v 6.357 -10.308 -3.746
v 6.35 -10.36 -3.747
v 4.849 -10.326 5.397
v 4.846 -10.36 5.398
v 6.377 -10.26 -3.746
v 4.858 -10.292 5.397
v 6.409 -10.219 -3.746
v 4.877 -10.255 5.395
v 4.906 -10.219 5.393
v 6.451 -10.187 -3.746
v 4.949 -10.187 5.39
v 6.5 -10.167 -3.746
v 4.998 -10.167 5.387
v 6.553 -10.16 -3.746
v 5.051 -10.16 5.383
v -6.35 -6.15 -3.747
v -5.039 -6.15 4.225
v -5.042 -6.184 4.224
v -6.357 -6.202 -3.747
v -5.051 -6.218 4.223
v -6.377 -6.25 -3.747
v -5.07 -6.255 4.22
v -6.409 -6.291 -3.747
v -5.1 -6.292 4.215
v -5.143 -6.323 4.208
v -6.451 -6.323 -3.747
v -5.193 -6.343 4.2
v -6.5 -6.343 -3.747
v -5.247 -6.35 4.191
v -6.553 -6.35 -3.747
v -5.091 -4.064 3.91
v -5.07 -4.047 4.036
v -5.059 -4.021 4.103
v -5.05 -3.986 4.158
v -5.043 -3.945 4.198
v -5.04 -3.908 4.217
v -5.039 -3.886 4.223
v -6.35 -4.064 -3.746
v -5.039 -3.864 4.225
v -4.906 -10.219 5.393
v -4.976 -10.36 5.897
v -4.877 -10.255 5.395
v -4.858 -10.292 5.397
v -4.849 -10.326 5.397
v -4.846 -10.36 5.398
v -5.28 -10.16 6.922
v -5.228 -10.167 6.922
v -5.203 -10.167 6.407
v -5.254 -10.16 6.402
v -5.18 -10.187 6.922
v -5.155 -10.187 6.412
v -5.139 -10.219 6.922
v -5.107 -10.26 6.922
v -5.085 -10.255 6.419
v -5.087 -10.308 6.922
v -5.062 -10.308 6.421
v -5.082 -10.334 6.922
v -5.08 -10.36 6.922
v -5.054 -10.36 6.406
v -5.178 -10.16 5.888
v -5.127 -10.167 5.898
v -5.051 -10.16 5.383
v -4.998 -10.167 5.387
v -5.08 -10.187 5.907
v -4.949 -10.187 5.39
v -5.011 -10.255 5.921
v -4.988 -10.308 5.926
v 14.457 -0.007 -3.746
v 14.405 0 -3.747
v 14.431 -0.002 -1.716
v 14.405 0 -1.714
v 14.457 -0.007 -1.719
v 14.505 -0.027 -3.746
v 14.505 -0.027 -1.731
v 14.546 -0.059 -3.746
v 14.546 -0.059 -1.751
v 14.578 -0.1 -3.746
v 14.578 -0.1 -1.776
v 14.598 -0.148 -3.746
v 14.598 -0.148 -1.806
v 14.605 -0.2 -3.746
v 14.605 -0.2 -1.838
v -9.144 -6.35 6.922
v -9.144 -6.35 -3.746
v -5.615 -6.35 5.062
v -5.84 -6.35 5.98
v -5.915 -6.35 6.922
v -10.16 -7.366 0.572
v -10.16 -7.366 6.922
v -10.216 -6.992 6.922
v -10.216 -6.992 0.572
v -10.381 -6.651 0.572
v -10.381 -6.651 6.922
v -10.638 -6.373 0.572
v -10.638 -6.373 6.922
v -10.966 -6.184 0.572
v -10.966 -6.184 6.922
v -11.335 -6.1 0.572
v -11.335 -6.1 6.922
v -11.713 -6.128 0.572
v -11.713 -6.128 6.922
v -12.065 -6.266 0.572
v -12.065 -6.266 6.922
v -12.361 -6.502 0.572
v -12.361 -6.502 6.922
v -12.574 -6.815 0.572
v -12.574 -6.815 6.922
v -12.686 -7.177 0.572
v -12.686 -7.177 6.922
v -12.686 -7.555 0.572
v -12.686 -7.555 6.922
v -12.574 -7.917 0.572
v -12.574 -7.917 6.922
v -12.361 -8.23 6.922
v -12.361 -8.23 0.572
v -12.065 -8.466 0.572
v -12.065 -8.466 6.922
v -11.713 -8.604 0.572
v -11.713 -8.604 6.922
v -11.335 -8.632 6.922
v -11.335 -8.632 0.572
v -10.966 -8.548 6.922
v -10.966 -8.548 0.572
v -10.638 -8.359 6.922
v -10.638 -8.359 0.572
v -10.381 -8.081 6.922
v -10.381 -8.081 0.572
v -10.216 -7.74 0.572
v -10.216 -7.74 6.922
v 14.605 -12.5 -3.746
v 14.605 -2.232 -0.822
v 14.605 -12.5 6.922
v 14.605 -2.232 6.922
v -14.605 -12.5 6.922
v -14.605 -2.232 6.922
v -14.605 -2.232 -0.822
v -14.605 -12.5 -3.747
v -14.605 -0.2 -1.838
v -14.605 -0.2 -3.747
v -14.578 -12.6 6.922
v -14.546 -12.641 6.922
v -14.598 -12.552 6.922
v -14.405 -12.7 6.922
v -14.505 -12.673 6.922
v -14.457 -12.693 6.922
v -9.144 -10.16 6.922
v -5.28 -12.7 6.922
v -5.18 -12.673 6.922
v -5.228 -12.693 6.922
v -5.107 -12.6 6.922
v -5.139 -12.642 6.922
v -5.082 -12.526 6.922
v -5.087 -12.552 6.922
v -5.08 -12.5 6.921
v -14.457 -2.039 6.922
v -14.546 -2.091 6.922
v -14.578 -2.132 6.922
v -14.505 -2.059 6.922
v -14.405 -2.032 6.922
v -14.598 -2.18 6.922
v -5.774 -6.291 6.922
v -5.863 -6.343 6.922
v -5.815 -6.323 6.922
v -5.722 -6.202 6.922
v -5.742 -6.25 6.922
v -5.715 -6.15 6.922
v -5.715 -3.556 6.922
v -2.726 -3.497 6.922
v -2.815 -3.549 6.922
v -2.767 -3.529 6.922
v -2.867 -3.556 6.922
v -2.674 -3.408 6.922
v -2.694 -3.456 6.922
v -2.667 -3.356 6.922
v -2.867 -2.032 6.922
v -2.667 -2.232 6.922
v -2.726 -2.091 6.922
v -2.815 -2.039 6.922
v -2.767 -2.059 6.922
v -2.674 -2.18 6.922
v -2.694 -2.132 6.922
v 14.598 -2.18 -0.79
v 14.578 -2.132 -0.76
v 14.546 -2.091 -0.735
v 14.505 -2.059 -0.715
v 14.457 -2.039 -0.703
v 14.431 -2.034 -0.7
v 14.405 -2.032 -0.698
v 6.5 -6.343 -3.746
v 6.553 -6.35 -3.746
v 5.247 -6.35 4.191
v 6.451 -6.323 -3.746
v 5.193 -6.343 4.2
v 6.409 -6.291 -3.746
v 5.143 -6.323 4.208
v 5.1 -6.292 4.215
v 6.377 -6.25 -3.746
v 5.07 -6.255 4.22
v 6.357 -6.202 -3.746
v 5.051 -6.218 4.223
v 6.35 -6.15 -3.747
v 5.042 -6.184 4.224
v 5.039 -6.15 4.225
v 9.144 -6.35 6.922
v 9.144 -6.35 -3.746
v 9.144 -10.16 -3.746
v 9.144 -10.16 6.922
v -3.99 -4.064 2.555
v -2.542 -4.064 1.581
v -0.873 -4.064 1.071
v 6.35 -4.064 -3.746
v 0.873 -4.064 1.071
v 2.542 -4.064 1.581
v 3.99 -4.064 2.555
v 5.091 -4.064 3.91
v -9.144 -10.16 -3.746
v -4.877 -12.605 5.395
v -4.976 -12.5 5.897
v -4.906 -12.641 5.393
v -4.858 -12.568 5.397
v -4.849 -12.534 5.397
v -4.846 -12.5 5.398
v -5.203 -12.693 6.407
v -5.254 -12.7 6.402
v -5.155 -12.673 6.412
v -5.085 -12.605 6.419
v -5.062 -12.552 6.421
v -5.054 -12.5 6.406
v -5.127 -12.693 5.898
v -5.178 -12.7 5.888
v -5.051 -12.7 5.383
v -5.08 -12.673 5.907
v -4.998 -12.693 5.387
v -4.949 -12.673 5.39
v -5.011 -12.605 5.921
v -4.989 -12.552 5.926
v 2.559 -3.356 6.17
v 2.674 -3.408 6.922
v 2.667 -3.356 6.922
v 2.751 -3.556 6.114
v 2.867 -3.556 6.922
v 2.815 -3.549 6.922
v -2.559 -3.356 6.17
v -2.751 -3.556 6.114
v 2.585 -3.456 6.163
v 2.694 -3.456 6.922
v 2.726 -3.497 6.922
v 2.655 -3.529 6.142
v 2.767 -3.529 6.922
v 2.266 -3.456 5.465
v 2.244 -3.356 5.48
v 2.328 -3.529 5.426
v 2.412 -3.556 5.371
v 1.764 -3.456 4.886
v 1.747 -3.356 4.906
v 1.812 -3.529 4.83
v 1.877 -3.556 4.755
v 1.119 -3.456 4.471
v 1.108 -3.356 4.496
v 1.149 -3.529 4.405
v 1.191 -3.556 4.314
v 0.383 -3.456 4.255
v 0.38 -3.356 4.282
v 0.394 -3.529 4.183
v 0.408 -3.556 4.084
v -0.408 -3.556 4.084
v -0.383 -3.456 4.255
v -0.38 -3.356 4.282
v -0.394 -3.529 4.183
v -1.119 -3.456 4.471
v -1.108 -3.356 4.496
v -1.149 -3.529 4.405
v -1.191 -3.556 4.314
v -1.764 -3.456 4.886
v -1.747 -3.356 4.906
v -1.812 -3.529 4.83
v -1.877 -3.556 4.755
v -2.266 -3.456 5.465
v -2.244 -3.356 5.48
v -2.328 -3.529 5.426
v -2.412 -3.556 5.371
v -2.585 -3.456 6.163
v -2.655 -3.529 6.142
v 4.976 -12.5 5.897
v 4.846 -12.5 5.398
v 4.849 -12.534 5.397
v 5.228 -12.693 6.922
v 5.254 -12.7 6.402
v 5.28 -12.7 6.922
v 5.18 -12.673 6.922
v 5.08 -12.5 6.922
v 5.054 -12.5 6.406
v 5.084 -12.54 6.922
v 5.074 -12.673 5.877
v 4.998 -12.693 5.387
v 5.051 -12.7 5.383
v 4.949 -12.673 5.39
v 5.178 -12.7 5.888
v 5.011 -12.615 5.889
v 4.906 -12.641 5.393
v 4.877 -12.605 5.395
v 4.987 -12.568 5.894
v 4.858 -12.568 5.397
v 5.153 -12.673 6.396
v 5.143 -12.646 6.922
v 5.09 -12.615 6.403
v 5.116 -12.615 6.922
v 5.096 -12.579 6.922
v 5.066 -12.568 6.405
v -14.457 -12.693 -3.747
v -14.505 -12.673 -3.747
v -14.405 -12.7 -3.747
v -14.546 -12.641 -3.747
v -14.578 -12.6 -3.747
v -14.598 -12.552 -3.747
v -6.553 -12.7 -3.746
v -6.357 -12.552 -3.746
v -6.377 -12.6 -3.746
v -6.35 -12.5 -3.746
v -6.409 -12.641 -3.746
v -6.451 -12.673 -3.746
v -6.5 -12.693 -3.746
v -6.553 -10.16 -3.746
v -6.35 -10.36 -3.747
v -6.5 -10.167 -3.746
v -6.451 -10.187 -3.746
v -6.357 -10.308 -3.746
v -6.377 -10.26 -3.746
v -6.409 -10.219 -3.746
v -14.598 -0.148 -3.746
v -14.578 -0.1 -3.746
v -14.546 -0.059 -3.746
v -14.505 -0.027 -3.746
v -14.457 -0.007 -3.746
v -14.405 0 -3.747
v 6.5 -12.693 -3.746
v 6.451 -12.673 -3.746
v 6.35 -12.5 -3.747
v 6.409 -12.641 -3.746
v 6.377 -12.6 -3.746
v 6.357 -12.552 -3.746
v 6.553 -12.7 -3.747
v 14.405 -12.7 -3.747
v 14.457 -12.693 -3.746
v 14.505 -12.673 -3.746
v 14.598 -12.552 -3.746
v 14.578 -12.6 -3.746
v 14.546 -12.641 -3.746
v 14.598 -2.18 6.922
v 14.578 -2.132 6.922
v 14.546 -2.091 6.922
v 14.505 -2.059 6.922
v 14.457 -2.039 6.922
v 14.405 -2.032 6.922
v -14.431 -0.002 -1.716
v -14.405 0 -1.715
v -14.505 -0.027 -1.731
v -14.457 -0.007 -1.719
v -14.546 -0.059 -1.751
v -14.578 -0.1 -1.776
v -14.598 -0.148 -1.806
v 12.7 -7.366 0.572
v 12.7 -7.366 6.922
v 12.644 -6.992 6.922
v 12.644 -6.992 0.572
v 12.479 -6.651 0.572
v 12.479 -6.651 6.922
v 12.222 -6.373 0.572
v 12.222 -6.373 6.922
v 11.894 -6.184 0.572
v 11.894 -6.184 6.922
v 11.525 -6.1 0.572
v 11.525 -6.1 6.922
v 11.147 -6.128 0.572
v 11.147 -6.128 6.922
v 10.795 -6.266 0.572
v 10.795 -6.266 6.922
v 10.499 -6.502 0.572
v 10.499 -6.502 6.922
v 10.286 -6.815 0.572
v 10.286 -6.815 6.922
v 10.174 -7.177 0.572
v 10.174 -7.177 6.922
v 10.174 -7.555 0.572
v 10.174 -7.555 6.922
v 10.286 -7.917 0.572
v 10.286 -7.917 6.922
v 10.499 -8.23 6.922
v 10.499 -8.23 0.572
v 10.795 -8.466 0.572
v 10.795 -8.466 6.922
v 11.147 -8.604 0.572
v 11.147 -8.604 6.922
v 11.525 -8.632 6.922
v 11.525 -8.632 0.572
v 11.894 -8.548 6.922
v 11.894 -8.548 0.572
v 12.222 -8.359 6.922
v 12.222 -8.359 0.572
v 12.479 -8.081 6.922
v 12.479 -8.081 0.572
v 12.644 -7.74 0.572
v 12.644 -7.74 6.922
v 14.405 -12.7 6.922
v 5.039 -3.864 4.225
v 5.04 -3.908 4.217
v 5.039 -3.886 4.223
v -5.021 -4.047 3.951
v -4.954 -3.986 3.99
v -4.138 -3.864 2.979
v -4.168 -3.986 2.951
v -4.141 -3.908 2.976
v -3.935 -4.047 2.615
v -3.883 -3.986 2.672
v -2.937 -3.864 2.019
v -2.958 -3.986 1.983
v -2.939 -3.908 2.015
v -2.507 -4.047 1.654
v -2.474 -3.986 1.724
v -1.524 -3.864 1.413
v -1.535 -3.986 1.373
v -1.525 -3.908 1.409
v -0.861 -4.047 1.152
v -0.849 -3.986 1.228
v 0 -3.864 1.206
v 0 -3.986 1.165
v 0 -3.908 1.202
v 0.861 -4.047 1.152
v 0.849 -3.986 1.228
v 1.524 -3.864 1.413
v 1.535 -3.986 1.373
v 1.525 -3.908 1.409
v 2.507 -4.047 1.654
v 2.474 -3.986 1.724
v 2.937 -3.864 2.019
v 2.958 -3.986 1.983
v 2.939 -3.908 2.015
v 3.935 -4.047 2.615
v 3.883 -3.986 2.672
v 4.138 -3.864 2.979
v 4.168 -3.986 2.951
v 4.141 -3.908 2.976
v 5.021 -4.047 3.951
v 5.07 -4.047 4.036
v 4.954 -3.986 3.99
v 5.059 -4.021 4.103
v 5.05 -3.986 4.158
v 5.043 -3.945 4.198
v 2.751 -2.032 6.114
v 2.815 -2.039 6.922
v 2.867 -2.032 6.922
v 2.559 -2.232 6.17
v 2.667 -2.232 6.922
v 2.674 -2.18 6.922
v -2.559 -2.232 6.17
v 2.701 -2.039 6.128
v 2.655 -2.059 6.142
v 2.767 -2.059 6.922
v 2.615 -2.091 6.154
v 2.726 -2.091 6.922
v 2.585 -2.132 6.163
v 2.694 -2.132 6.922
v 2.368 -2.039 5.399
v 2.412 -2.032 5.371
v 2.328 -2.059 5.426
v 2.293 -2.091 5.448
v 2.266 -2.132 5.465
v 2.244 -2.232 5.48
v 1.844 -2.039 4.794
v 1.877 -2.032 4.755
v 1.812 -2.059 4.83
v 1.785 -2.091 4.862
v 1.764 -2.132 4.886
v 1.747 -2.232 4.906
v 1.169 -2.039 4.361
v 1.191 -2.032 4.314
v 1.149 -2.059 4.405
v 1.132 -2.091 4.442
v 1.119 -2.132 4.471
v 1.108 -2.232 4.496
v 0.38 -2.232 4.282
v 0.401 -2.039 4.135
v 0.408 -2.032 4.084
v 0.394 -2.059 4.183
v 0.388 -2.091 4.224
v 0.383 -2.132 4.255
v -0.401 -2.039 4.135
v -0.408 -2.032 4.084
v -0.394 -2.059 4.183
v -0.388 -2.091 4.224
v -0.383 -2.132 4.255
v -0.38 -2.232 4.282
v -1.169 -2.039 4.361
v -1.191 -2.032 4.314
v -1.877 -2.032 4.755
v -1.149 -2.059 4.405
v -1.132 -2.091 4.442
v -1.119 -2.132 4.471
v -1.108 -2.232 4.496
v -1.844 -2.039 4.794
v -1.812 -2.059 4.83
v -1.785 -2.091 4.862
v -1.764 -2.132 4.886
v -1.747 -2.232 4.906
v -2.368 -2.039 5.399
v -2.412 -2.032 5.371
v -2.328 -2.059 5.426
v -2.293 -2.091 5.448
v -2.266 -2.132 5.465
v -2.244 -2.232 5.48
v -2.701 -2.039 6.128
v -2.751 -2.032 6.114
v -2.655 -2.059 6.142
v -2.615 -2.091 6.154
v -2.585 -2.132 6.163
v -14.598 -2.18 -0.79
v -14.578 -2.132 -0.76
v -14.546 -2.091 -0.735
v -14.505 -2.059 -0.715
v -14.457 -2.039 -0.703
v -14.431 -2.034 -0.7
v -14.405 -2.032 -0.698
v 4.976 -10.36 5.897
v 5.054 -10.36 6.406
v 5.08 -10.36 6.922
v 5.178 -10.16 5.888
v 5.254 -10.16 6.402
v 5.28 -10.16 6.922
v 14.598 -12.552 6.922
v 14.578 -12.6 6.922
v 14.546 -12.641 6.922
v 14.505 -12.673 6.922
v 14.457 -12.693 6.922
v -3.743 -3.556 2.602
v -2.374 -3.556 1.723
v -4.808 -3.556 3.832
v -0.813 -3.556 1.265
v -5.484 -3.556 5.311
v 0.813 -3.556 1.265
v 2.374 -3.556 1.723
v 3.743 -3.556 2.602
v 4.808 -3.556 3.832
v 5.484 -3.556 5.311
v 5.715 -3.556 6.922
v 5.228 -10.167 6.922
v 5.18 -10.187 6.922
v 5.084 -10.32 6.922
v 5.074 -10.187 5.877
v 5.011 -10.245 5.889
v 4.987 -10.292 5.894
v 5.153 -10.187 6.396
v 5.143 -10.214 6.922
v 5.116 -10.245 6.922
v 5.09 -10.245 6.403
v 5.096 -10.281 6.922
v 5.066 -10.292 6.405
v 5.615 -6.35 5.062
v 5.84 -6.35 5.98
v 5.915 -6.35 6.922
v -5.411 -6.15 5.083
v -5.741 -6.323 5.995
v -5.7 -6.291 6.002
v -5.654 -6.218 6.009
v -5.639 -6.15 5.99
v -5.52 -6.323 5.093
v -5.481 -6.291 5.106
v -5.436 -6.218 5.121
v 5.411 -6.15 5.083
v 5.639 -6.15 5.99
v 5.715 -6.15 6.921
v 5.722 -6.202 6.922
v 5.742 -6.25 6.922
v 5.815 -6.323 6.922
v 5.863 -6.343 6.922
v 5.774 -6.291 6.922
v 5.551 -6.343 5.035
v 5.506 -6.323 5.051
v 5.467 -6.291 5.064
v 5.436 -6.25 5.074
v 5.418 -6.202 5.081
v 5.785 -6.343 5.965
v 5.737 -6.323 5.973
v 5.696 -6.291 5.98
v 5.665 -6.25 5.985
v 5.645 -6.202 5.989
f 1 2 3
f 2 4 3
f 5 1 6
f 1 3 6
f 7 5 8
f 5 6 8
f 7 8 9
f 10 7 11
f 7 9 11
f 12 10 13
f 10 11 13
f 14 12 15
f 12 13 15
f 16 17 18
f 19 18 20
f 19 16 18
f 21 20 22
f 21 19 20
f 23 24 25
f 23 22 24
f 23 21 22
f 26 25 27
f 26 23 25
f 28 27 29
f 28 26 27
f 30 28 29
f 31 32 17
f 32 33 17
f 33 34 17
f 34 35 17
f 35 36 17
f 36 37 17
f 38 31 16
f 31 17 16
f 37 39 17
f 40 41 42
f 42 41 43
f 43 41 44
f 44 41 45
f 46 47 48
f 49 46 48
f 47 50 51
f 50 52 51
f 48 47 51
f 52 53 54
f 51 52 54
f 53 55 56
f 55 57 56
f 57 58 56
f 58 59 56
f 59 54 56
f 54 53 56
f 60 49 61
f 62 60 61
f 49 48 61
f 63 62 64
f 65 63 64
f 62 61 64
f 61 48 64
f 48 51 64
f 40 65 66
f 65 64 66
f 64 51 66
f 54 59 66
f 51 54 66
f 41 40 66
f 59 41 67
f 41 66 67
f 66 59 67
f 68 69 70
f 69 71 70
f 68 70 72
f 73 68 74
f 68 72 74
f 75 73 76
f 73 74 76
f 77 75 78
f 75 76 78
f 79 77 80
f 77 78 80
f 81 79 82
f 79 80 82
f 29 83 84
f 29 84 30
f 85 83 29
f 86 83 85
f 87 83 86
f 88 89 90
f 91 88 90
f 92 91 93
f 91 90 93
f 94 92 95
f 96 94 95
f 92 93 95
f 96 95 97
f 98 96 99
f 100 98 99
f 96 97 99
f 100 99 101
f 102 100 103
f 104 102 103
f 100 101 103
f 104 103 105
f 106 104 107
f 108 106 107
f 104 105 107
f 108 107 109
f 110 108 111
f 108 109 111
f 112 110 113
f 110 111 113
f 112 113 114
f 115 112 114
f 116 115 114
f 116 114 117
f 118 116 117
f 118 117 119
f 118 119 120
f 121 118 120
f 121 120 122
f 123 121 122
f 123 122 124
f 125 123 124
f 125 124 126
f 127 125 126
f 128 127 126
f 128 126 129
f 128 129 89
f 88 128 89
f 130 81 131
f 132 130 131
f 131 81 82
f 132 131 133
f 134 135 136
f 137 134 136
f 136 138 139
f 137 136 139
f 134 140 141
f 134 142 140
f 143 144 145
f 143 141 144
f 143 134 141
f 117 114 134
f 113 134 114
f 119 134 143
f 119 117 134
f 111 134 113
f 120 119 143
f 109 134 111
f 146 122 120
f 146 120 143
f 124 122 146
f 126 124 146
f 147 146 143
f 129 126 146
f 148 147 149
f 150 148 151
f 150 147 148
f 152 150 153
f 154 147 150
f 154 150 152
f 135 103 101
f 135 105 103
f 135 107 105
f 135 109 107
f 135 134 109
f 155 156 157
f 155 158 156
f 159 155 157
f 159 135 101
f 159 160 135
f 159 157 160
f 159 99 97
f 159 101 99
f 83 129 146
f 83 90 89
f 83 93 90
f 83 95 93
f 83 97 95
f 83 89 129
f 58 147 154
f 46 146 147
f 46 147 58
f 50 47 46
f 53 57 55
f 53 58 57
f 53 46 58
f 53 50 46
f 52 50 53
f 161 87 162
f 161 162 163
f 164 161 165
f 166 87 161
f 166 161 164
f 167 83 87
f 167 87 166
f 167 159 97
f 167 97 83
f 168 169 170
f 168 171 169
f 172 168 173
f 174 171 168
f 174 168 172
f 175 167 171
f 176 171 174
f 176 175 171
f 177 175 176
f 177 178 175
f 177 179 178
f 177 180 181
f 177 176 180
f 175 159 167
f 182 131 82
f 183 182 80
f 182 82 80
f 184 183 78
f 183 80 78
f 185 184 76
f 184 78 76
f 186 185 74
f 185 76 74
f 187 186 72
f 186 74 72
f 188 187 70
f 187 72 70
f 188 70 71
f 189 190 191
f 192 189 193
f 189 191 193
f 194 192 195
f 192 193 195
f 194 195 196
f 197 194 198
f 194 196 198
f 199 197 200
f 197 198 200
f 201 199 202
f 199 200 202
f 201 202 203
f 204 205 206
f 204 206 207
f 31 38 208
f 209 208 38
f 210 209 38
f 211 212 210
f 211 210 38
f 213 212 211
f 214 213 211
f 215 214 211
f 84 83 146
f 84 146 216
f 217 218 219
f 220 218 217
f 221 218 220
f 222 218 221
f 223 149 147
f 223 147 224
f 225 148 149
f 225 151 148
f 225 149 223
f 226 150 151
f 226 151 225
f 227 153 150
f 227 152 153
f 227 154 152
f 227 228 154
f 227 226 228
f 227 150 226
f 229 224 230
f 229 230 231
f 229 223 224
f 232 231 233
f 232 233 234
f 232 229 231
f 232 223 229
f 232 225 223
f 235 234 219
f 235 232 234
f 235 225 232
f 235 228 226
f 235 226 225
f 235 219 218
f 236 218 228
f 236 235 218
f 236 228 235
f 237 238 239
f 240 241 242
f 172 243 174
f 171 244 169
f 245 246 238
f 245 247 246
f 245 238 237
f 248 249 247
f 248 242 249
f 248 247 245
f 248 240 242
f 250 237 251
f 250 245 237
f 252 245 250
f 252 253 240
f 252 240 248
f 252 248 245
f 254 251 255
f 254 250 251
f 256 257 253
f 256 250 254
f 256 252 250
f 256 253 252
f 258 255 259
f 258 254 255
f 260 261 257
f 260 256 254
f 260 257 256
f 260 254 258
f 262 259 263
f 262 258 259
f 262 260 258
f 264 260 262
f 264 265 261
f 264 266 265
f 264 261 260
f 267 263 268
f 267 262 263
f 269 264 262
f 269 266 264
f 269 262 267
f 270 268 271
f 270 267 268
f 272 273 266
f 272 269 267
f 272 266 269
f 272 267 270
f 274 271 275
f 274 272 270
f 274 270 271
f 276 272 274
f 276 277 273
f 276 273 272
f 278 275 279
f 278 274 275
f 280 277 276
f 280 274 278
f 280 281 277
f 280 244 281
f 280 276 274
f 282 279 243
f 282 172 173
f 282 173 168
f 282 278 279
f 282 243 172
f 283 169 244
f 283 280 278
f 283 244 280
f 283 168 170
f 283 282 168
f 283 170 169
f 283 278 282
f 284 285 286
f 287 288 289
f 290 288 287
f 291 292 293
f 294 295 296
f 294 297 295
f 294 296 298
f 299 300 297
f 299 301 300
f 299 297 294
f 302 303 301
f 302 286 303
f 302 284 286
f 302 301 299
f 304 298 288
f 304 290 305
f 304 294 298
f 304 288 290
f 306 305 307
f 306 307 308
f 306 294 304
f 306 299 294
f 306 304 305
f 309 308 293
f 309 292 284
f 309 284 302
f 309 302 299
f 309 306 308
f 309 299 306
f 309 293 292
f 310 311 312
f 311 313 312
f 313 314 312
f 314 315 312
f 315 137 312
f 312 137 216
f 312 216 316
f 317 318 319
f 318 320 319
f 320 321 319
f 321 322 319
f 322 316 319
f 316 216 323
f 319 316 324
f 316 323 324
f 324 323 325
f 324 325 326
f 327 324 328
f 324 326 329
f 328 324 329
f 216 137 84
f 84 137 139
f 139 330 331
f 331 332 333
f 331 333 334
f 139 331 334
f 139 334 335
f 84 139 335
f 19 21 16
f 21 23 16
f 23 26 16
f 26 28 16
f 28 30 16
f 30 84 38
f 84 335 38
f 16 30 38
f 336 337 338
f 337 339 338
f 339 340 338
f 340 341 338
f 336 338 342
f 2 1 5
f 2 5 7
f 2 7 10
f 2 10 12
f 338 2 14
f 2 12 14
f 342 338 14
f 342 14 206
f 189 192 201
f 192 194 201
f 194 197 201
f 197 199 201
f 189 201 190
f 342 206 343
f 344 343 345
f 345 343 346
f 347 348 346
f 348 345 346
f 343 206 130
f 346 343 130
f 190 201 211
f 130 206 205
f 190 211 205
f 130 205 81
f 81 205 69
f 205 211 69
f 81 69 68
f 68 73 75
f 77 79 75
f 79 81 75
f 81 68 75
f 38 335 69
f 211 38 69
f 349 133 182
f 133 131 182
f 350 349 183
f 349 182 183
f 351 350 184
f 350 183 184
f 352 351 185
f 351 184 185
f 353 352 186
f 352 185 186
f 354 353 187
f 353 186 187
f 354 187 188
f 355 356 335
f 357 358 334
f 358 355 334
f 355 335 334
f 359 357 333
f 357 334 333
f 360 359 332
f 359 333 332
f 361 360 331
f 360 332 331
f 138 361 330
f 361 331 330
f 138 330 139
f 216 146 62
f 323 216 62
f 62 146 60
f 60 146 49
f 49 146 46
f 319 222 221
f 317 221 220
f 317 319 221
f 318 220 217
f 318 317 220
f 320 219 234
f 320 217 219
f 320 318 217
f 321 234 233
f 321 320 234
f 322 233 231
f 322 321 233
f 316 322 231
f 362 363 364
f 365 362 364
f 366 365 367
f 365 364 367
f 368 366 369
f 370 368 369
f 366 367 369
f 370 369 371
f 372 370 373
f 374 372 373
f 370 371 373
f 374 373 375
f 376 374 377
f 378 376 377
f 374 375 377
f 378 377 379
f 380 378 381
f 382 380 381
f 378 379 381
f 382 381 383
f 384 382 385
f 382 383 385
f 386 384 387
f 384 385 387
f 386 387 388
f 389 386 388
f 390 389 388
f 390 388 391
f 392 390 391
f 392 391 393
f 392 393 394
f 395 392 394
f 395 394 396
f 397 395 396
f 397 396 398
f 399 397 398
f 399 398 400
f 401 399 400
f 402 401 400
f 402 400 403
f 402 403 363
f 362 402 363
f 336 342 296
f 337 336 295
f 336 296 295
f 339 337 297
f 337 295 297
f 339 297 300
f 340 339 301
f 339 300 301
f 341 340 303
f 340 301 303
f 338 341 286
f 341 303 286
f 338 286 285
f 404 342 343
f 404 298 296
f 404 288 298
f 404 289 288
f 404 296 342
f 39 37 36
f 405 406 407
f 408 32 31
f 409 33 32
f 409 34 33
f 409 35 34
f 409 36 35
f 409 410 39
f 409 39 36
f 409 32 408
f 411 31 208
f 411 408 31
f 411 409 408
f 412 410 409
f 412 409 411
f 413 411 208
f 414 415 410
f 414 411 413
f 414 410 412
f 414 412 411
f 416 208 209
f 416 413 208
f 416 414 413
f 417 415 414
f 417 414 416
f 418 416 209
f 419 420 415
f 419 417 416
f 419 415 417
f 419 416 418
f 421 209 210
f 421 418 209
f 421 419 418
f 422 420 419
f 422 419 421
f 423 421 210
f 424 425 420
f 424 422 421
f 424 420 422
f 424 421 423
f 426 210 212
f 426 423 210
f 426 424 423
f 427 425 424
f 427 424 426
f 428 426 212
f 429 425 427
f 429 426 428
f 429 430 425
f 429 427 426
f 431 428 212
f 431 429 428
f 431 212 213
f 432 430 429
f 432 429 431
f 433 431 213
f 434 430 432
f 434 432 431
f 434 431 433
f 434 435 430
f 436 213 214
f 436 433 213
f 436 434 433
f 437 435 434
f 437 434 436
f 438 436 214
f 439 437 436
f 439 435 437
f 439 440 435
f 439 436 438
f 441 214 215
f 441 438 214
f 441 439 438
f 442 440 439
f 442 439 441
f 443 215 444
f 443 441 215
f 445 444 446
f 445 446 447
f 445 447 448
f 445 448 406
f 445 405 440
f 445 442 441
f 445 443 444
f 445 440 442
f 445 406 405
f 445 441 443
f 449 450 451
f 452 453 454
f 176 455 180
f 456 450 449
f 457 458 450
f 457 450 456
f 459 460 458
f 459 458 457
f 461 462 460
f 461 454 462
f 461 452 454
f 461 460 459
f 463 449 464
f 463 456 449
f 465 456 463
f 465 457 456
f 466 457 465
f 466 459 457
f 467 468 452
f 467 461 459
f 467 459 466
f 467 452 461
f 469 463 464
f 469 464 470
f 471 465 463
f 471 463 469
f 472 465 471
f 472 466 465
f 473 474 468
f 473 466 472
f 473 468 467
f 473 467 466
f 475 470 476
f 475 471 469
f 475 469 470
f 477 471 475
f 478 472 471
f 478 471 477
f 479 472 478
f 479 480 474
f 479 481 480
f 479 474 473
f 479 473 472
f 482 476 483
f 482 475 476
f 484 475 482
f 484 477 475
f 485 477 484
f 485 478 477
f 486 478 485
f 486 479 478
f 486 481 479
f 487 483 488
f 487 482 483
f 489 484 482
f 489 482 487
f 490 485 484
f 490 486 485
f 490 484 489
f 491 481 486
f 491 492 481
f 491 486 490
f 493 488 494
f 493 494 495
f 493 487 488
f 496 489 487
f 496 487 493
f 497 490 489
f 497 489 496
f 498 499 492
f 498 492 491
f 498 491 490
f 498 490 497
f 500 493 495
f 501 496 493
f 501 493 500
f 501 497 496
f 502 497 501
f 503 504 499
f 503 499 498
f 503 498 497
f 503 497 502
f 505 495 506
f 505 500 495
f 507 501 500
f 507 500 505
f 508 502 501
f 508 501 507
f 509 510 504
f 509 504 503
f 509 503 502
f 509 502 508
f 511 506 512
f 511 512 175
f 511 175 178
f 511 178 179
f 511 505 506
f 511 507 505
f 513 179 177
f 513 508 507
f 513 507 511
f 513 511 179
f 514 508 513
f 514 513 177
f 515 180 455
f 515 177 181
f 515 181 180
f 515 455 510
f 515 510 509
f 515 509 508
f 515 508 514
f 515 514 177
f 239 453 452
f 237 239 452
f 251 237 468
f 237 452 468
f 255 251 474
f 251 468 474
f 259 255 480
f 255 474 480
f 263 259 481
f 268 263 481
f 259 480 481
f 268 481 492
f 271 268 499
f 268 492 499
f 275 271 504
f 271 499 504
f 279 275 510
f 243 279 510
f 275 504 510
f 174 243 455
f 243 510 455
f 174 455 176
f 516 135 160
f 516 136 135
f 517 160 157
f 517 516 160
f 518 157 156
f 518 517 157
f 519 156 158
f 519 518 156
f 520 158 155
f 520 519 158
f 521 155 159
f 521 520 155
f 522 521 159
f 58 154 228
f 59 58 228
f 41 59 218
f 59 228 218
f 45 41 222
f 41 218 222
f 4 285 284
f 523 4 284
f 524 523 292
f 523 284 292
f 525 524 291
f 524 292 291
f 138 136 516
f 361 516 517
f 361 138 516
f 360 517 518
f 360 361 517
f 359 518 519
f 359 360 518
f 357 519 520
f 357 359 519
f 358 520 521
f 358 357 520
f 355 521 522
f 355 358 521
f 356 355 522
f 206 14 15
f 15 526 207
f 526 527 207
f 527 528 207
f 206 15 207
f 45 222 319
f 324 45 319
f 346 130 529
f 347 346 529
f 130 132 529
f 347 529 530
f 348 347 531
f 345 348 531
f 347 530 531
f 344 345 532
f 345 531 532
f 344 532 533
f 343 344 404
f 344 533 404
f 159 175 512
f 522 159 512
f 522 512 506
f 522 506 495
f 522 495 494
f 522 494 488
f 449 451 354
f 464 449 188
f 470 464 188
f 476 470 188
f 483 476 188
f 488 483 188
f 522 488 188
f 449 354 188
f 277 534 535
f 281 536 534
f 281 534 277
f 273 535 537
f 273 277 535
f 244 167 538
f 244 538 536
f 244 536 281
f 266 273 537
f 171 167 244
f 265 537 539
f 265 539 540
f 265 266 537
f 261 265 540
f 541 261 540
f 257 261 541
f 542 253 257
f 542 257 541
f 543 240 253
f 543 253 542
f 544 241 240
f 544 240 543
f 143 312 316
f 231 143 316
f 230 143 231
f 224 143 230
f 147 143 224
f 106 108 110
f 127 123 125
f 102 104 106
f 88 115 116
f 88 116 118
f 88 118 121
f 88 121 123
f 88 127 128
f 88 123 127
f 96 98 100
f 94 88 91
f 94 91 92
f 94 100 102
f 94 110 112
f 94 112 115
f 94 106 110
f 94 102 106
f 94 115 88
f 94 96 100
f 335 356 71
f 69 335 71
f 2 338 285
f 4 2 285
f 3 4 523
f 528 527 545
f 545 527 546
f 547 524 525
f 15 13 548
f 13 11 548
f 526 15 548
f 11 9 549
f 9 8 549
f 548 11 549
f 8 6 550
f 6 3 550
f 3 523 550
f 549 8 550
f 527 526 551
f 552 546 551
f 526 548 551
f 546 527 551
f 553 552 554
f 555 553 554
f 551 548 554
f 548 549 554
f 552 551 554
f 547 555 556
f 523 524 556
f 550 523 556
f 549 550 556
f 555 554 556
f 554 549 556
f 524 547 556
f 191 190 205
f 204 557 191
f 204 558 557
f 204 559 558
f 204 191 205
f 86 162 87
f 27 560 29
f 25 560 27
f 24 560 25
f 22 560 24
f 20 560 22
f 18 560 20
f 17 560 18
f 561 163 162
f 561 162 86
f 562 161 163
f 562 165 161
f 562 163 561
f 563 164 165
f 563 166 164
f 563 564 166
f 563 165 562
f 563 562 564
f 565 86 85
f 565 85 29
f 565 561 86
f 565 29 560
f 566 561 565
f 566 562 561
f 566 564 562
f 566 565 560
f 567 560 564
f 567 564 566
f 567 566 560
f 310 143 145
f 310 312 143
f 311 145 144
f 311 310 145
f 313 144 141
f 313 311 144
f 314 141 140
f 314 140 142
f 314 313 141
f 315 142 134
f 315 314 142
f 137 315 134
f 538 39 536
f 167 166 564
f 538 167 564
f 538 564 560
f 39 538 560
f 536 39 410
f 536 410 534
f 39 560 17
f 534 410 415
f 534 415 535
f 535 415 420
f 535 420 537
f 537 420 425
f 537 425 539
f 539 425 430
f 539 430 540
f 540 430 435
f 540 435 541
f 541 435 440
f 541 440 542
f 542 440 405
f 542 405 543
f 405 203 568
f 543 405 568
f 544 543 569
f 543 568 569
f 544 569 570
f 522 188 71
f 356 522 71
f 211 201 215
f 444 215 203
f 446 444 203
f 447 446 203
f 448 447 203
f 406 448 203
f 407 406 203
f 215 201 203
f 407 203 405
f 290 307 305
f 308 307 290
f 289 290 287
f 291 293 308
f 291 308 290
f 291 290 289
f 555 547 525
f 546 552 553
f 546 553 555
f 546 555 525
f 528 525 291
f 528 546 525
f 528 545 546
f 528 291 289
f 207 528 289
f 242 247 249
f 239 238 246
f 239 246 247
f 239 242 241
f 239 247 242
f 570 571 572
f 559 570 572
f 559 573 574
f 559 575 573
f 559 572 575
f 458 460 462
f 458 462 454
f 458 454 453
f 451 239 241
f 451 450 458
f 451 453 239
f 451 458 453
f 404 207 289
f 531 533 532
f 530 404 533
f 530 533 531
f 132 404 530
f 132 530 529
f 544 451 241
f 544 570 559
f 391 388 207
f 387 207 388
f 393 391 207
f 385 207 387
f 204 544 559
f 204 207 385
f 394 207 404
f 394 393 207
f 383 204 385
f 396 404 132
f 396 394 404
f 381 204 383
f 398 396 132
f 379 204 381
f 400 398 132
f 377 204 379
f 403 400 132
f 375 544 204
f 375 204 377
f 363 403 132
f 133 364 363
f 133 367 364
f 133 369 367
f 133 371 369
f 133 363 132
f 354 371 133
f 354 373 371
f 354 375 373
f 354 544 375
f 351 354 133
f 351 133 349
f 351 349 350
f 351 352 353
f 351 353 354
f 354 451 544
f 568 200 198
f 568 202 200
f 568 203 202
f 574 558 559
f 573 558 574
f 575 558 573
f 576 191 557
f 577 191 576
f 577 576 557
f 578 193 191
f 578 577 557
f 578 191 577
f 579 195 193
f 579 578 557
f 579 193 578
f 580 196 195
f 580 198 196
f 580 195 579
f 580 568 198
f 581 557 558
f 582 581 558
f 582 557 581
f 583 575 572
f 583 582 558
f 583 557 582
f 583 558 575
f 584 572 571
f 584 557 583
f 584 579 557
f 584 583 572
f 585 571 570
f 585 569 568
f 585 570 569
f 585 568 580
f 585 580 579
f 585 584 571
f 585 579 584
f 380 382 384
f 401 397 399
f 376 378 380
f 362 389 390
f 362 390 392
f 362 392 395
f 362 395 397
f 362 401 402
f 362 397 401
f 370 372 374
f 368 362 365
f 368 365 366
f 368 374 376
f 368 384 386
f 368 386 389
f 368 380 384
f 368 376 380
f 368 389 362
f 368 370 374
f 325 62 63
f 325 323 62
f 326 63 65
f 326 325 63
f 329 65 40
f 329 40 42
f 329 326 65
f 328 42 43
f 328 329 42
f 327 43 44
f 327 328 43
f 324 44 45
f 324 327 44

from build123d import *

# Parameters (mm, degrees)
F1_DEPTH  = 12.7
F4_DEPTH  = 3.81
F6_DEPTH  = 8.636
F8_DEPTH  = 29.211
F9_R      = 2.667
F10_DEPTH = 4.318
F12_DEPTH = 5.08
F13_R     = 1.27
F14_DEPTH = 12.7
F15_R     = 5.715
F16_DEPTH = 2.794
F17_W     = 29.21
F17_H     = 12.7
F18_DEPTH = 11.43
F19_R     = 0.2


with BuildPart() as f1:
    # F0 (on Front) → F1 (new body)
    with BuildSketch(Plane.XZ):
        Polygon((-14.605, -3.7465), (14.605, -3.7465), (14.605, 3.7465), (14.605, 18.3515), (-14.605, 18.3515), (-14.605, 3.7465), align=None)
    extrude(amount=F1_DEPTH)

    # F3 (on offset) → F4 (cut)
    with BuildSketch(Plane.XZ.offset(6.35)):
        with BuildLine():
            Line((-9.144, -3.7465), (9.144, -3.7465))
            Line((9.144, -3.7465), (9.144, 6.9215))
            ThreePointArc((9.144, 6.9215), (0, 16.0655), (-9.144, 6.9215))
            Line((-9.144, 6.9215), (-9.144, -3.7465))
        make_face()
    extrude(amount=F4_DEPTH, mode=Mode.SUBTRACT)

    # F5 (on face) → F6 (cut)
    with BuildSketch(Plane.XZ.offset(12.7)):
        with BuildLine():
            Line((6.35, -3.7465), (4.8460111432, 5.3975))
            ThreePointArc((4.8460111432, 5.3975), (0, 12.0015), (-4.8460111432, 5.3975))
            Line((-4.8460111432, 5.3975), (-6.35, -3.7465))
            Line((-6.35, -3.7465), (6.35, -3.7465))
        make_face()
    extrude(amount=-F6_DEPTH, mode=Mode.SUBTRACT)

    # F7 (on face) → F8 (cut, through all)
    with BuildSketch(Plane.YZ.offset(14.605)):
        Polygon((-2.032, -0.6985), (0, -1.7145), (0, 16.3195), (-2.032, 15.3035), align=None)
    extrude(amount=-F8_DEPTH, mode=Mode.SUBTRACT)

    # F9 (on face) → F10 (cut, through all)
    with BuildSketch(Plane(origin=(0, -2.032, 0), x_dir=(-1, 0, 0), z_dir=(0, 1, 0))):
        with Locations((0, 6.9215)):
            Circle(F9_R)
    extrude(amount=-F10_DEPTH, mode=Mode.SUBTRACT)

    # F11 (on face) → F12 (cut)
    with BuildSketch(Plane.XY.offset(18.3515)):
        with BuildLine():
            Line((14.605, -4.191), (11.43, -4.191))
            ThreePointArc((11.43, -4.191), (8.255, -7.366), (11.43, -10.541))
            Line((11.43, -10.541), (14.605, -10.541))
            Line((14.605, -10.541), (14.605, -4.191))
        make_face()
        with BuildLine():
            ThreePointArc((-11.43, -10.541), (-8.255, -7.366), (-11.43, -4.191))
            Line((-11.43, -4.191), (-14.605, -4.191))
            Line((-14.605, -4.191), (-14.605, -10.541))
            Line((-14.605, -10.541), (-11.43, -10.541))
        make_face()
    extrude(amount=-F12_DEPTH, mode=Mode.SUBTRACT)

    # F13 (on face) → F14 (cut)
    with BuildSketch(Plane.XY.offset(13.2715)):
        with Locations((11.43, -7.366)):
            Circle(F13_R)
        with Locations((-11.43, -7.366)):
            Circle(F13_R)
    extrude(amount=-F14_DEPTH, mode=Mode.SUBTRACT)

    # F15 (on face) → F16 (cut)
    with BuildSketch(Plane.XZ.offset(6.35)):
        with Locations((0, 6.9215)):
            Circle(F15_R)
    extrude(amount=-F16_DEPTH, mode=Mode.SUBTRACT)

    # F17 (on face) → F18 (cut)
    with BuildSketch(Plane.XY.offset(18.3515)):
        with Locations((0, -6.35)):
            Rectangle(F17_W, F17_H)
    extrude(amount=-F18_DEPTH, mode=Mode.SUBTRACT)

    # F19
    f19_edges = [f1.edges().sort_by_distance(p)[0] for p in [
        (14.605, -12.7, 1.5875),
        (5.021162, -12.7, 6.150571),
        (5.598006, -12.7, 0.8255),
        (5.021162, -10.16, 6.150571),
        (5.598006, -10.16, 0.8255),
        (5.543389, -6.35, 5.531512),
        (5.694431, -6.35, 0.239251),
        (-5.021162, -12.7, 6.150571),
        (-5.021162, -10.16, 6.150571),
        (-5.598006, -10.16, 0.8255),
        (-5.598006, -12.7, 0.8255),
        (-5.543389, -6.35, 5.531512),
        (-5.694431, -6.35, 0.239251),
        (0, -4.064, 1.2065),
        (0, -3.556, 4.2545),
        (0, -2.032, 4.2545),
        (14.605, -2.032, 3.1115),
        (-14.605, -2.032, 3.1115),
        (-14.605, -1.016, -1.2065),
        (-14.605, 0, -2.7305),
        (14.605, -1.016, -1.2065),
        (14.605, 0, -2.7305),
        (-14.605, -12.7, 1.5875),
    ]]
    fillet(f19_edges, radius=F19_R)


solid = f1.part
